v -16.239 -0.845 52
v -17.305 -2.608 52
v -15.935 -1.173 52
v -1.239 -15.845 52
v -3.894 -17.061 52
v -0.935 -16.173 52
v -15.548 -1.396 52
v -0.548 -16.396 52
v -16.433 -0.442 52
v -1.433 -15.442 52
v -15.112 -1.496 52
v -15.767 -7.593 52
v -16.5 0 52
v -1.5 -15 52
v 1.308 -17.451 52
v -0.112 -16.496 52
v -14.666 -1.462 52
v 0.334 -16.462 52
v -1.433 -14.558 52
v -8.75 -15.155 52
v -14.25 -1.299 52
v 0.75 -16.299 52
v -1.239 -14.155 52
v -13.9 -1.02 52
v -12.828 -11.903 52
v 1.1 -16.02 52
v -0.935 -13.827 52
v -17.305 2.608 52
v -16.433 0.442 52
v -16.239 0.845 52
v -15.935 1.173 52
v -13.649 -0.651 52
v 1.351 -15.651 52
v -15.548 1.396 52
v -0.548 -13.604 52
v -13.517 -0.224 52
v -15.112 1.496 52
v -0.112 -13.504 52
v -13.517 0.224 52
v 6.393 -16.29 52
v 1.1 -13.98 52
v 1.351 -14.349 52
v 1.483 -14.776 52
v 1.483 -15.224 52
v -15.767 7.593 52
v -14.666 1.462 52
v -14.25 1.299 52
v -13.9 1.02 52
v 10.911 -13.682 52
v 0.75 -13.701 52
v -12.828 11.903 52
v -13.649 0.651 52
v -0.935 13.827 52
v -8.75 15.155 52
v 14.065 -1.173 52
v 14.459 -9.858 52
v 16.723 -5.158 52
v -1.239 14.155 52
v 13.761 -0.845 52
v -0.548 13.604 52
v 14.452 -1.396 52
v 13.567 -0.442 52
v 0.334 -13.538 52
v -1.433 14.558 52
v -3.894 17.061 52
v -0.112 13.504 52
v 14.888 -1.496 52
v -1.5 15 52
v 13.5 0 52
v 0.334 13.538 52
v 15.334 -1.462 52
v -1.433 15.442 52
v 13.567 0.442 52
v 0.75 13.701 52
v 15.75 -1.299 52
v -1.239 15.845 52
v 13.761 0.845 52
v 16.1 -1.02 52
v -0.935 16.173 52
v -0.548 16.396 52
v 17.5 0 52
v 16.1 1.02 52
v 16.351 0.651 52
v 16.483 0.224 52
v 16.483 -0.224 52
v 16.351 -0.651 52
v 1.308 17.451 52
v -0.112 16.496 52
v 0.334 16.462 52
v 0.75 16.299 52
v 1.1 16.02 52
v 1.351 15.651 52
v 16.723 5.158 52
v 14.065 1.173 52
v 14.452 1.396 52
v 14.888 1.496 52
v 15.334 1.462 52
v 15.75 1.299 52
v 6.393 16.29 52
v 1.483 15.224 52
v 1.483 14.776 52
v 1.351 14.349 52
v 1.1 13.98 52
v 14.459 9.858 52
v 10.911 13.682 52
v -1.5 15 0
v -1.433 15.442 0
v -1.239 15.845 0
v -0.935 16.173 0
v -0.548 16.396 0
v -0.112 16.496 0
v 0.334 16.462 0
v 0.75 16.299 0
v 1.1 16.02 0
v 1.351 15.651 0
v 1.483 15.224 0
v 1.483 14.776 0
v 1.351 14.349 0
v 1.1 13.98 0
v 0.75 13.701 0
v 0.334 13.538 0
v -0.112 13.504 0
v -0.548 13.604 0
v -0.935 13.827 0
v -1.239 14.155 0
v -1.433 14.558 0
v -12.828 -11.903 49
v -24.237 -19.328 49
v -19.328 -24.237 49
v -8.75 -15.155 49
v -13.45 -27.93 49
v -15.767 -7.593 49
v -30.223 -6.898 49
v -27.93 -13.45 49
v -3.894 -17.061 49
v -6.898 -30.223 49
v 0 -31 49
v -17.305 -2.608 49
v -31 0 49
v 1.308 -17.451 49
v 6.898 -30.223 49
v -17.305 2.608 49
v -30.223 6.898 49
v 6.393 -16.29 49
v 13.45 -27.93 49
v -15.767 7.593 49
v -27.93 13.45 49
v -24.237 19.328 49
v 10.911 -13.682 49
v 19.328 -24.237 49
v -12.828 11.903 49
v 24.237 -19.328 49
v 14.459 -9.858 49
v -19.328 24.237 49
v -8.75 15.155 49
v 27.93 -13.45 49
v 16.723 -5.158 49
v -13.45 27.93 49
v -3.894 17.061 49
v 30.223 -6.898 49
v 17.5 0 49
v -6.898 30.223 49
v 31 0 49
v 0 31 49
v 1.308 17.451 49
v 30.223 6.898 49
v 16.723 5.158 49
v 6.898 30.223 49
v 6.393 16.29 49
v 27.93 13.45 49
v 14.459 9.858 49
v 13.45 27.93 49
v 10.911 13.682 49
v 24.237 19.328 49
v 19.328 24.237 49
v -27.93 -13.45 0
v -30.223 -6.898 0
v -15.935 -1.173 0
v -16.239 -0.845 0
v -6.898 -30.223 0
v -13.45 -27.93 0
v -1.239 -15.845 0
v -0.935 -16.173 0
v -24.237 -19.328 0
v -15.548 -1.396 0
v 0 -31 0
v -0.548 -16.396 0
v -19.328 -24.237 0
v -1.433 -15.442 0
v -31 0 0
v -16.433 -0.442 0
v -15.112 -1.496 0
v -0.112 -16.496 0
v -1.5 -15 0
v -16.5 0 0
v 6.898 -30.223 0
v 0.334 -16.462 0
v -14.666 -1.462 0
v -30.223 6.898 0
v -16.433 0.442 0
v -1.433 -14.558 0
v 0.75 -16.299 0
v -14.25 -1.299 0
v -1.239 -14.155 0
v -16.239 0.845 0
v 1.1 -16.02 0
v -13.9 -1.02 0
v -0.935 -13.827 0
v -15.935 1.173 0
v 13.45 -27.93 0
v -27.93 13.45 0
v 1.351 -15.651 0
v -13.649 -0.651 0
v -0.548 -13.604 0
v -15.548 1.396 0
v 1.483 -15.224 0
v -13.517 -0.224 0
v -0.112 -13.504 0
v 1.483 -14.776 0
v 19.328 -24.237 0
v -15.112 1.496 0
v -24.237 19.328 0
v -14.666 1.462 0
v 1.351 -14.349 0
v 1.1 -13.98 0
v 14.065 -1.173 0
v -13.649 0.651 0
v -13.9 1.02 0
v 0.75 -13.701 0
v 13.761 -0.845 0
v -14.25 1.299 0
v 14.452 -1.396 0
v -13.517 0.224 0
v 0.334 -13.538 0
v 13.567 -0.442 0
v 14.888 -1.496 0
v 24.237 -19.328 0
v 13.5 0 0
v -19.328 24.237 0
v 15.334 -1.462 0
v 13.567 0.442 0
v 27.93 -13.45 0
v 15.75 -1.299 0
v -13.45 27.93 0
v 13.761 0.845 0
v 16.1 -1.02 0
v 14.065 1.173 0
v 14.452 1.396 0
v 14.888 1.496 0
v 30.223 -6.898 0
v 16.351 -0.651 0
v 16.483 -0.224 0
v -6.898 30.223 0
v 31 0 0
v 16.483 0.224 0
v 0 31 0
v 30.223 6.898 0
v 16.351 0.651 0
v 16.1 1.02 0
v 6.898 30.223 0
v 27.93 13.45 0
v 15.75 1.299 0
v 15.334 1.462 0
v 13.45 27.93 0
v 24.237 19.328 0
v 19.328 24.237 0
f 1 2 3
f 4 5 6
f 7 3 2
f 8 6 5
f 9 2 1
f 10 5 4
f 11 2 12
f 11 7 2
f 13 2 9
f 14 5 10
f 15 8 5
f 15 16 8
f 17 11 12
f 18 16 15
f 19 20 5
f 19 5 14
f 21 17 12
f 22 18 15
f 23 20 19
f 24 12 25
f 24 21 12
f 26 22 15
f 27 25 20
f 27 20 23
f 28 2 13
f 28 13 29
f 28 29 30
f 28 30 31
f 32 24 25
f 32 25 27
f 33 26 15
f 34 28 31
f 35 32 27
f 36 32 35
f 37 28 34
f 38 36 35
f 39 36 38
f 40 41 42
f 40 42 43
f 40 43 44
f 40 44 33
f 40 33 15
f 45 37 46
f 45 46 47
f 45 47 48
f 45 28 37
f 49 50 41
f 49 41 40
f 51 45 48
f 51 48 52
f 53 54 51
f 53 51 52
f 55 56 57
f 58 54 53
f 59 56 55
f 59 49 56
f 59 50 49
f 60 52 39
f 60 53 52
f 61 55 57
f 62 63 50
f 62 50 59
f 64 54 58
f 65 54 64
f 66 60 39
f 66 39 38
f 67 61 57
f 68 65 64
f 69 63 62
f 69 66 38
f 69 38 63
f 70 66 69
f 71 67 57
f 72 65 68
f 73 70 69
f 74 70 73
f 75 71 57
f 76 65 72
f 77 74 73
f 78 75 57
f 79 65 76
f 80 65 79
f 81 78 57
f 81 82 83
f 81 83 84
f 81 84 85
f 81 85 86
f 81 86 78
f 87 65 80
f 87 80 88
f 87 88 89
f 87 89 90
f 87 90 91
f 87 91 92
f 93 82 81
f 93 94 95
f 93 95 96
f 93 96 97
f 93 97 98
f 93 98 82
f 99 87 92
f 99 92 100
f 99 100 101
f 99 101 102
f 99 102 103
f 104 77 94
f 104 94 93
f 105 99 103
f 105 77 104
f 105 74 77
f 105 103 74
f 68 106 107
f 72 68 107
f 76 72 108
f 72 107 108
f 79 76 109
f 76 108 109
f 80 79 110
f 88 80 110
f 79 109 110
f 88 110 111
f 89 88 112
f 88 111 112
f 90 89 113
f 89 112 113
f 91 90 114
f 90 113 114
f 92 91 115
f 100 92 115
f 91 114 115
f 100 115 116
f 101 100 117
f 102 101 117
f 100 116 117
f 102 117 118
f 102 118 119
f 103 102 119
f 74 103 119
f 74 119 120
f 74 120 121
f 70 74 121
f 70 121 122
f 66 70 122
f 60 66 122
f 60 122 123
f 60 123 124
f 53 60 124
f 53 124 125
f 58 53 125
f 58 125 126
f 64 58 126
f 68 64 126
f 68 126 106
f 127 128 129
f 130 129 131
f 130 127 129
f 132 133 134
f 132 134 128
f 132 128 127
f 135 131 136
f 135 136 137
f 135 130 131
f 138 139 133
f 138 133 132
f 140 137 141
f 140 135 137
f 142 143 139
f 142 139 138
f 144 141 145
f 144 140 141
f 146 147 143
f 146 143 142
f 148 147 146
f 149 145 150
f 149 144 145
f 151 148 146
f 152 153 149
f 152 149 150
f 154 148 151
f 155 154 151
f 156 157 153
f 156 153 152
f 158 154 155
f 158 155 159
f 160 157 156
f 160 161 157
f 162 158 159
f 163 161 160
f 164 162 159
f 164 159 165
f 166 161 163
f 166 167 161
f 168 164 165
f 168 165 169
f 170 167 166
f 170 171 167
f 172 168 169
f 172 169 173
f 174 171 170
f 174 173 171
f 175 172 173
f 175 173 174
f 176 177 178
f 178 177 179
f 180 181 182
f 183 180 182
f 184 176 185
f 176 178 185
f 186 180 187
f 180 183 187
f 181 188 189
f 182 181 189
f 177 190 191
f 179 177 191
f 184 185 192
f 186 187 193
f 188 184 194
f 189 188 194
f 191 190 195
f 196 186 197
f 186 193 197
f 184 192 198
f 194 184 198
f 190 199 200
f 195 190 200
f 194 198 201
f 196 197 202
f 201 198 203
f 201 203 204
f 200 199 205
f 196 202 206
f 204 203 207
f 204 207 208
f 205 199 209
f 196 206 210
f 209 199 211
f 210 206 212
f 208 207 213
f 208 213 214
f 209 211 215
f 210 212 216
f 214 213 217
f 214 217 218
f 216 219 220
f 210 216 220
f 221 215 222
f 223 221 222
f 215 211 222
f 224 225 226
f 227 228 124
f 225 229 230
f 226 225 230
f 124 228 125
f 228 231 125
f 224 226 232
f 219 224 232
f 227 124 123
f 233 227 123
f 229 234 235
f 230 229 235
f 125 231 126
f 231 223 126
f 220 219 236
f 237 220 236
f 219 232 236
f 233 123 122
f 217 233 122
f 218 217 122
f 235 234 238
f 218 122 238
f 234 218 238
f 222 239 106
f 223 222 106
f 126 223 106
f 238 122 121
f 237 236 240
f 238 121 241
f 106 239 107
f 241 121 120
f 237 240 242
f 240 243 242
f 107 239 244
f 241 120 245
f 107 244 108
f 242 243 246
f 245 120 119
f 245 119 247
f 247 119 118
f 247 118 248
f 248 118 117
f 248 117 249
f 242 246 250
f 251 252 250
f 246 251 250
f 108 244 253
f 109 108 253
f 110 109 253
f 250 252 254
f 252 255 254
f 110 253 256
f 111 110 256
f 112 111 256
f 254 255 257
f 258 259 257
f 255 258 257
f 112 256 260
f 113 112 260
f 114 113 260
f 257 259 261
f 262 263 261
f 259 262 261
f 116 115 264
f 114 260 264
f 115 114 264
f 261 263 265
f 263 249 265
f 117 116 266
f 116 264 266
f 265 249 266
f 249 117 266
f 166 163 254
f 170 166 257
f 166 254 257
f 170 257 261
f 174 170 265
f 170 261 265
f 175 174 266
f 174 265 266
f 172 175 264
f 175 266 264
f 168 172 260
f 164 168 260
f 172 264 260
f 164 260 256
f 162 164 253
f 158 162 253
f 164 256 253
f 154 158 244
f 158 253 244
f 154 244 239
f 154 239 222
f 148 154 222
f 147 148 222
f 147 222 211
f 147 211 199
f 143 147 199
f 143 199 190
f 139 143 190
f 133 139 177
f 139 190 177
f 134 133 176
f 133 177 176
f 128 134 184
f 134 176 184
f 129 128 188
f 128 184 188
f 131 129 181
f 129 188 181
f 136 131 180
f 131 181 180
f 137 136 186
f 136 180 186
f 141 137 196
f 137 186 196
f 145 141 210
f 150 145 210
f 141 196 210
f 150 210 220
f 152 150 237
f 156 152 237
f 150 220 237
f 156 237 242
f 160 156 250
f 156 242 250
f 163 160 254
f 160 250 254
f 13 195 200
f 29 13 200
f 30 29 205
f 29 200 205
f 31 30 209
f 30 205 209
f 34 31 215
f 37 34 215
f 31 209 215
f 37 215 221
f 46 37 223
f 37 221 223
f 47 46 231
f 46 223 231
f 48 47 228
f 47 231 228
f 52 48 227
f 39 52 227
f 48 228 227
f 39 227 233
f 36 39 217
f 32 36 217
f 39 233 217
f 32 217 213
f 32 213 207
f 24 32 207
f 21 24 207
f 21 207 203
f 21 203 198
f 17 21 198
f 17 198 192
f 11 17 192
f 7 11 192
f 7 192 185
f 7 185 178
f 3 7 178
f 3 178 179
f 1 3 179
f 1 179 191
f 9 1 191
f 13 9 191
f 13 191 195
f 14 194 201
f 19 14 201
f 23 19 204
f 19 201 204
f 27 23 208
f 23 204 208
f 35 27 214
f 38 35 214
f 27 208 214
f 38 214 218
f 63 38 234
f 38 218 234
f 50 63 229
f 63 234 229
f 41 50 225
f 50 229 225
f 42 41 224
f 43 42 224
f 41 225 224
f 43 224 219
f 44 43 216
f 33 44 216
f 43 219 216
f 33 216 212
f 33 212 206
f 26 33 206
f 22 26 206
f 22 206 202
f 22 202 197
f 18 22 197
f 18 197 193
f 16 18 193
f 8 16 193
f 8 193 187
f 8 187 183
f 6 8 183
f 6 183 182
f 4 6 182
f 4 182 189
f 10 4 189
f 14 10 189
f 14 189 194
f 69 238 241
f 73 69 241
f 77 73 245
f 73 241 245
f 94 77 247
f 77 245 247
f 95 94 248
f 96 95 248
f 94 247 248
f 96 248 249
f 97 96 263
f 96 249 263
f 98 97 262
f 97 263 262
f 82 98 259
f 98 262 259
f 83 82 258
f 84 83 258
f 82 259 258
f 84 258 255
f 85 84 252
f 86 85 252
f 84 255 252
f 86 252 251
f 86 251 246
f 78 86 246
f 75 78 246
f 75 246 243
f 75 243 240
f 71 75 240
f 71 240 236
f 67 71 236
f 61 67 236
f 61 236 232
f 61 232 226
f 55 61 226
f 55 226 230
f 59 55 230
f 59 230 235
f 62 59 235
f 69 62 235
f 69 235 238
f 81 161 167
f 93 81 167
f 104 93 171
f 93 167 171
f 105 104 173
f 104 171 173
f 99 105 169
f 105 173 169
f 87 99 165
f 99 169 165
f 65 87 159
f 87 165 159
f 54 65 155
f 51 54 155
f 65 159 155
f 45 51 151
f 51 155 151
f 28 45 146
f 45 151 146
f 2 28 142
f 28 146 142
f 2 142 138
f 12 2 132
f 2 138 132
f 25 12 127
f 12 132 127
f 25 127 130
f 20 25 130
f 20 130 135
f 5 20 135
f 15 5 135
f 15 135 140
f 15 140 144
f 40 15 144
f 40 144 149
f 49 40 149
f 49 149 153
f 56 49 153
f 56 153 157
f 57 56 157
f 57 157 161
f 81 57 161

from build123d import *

# Parameters (mm, degrees)
F0_R     = 31
F1_DEPTH = 49
F2_R     = 17.5
F4_DEPTH = 52
F6_D     = 3


# Not quite as in the source:
# - the program builds the solid bodies; features that only make, move or delete a surface that nothing else refers to are left out


with BuildPart() as f1:
    # F0 (on Top) → F1 (new body)
    with BuildSketch(Plane.XY):
        Circle(F0_R)
    extrude(amount=F1_DEPTH)

    # F2 (on Top) → F4 (join)
    with BuildSketch(Plane.XY):
        Circle(F2_R)
    extrude(amount=F4_DEPTH)

    # F6 (through all)
    with Locations(Plane.XY.offset(52)):
        with Locations((0, 15), (-15, 0), (0, -15), (15, 0)):
            Hole(F6_D / 2)


solid = f1.part
